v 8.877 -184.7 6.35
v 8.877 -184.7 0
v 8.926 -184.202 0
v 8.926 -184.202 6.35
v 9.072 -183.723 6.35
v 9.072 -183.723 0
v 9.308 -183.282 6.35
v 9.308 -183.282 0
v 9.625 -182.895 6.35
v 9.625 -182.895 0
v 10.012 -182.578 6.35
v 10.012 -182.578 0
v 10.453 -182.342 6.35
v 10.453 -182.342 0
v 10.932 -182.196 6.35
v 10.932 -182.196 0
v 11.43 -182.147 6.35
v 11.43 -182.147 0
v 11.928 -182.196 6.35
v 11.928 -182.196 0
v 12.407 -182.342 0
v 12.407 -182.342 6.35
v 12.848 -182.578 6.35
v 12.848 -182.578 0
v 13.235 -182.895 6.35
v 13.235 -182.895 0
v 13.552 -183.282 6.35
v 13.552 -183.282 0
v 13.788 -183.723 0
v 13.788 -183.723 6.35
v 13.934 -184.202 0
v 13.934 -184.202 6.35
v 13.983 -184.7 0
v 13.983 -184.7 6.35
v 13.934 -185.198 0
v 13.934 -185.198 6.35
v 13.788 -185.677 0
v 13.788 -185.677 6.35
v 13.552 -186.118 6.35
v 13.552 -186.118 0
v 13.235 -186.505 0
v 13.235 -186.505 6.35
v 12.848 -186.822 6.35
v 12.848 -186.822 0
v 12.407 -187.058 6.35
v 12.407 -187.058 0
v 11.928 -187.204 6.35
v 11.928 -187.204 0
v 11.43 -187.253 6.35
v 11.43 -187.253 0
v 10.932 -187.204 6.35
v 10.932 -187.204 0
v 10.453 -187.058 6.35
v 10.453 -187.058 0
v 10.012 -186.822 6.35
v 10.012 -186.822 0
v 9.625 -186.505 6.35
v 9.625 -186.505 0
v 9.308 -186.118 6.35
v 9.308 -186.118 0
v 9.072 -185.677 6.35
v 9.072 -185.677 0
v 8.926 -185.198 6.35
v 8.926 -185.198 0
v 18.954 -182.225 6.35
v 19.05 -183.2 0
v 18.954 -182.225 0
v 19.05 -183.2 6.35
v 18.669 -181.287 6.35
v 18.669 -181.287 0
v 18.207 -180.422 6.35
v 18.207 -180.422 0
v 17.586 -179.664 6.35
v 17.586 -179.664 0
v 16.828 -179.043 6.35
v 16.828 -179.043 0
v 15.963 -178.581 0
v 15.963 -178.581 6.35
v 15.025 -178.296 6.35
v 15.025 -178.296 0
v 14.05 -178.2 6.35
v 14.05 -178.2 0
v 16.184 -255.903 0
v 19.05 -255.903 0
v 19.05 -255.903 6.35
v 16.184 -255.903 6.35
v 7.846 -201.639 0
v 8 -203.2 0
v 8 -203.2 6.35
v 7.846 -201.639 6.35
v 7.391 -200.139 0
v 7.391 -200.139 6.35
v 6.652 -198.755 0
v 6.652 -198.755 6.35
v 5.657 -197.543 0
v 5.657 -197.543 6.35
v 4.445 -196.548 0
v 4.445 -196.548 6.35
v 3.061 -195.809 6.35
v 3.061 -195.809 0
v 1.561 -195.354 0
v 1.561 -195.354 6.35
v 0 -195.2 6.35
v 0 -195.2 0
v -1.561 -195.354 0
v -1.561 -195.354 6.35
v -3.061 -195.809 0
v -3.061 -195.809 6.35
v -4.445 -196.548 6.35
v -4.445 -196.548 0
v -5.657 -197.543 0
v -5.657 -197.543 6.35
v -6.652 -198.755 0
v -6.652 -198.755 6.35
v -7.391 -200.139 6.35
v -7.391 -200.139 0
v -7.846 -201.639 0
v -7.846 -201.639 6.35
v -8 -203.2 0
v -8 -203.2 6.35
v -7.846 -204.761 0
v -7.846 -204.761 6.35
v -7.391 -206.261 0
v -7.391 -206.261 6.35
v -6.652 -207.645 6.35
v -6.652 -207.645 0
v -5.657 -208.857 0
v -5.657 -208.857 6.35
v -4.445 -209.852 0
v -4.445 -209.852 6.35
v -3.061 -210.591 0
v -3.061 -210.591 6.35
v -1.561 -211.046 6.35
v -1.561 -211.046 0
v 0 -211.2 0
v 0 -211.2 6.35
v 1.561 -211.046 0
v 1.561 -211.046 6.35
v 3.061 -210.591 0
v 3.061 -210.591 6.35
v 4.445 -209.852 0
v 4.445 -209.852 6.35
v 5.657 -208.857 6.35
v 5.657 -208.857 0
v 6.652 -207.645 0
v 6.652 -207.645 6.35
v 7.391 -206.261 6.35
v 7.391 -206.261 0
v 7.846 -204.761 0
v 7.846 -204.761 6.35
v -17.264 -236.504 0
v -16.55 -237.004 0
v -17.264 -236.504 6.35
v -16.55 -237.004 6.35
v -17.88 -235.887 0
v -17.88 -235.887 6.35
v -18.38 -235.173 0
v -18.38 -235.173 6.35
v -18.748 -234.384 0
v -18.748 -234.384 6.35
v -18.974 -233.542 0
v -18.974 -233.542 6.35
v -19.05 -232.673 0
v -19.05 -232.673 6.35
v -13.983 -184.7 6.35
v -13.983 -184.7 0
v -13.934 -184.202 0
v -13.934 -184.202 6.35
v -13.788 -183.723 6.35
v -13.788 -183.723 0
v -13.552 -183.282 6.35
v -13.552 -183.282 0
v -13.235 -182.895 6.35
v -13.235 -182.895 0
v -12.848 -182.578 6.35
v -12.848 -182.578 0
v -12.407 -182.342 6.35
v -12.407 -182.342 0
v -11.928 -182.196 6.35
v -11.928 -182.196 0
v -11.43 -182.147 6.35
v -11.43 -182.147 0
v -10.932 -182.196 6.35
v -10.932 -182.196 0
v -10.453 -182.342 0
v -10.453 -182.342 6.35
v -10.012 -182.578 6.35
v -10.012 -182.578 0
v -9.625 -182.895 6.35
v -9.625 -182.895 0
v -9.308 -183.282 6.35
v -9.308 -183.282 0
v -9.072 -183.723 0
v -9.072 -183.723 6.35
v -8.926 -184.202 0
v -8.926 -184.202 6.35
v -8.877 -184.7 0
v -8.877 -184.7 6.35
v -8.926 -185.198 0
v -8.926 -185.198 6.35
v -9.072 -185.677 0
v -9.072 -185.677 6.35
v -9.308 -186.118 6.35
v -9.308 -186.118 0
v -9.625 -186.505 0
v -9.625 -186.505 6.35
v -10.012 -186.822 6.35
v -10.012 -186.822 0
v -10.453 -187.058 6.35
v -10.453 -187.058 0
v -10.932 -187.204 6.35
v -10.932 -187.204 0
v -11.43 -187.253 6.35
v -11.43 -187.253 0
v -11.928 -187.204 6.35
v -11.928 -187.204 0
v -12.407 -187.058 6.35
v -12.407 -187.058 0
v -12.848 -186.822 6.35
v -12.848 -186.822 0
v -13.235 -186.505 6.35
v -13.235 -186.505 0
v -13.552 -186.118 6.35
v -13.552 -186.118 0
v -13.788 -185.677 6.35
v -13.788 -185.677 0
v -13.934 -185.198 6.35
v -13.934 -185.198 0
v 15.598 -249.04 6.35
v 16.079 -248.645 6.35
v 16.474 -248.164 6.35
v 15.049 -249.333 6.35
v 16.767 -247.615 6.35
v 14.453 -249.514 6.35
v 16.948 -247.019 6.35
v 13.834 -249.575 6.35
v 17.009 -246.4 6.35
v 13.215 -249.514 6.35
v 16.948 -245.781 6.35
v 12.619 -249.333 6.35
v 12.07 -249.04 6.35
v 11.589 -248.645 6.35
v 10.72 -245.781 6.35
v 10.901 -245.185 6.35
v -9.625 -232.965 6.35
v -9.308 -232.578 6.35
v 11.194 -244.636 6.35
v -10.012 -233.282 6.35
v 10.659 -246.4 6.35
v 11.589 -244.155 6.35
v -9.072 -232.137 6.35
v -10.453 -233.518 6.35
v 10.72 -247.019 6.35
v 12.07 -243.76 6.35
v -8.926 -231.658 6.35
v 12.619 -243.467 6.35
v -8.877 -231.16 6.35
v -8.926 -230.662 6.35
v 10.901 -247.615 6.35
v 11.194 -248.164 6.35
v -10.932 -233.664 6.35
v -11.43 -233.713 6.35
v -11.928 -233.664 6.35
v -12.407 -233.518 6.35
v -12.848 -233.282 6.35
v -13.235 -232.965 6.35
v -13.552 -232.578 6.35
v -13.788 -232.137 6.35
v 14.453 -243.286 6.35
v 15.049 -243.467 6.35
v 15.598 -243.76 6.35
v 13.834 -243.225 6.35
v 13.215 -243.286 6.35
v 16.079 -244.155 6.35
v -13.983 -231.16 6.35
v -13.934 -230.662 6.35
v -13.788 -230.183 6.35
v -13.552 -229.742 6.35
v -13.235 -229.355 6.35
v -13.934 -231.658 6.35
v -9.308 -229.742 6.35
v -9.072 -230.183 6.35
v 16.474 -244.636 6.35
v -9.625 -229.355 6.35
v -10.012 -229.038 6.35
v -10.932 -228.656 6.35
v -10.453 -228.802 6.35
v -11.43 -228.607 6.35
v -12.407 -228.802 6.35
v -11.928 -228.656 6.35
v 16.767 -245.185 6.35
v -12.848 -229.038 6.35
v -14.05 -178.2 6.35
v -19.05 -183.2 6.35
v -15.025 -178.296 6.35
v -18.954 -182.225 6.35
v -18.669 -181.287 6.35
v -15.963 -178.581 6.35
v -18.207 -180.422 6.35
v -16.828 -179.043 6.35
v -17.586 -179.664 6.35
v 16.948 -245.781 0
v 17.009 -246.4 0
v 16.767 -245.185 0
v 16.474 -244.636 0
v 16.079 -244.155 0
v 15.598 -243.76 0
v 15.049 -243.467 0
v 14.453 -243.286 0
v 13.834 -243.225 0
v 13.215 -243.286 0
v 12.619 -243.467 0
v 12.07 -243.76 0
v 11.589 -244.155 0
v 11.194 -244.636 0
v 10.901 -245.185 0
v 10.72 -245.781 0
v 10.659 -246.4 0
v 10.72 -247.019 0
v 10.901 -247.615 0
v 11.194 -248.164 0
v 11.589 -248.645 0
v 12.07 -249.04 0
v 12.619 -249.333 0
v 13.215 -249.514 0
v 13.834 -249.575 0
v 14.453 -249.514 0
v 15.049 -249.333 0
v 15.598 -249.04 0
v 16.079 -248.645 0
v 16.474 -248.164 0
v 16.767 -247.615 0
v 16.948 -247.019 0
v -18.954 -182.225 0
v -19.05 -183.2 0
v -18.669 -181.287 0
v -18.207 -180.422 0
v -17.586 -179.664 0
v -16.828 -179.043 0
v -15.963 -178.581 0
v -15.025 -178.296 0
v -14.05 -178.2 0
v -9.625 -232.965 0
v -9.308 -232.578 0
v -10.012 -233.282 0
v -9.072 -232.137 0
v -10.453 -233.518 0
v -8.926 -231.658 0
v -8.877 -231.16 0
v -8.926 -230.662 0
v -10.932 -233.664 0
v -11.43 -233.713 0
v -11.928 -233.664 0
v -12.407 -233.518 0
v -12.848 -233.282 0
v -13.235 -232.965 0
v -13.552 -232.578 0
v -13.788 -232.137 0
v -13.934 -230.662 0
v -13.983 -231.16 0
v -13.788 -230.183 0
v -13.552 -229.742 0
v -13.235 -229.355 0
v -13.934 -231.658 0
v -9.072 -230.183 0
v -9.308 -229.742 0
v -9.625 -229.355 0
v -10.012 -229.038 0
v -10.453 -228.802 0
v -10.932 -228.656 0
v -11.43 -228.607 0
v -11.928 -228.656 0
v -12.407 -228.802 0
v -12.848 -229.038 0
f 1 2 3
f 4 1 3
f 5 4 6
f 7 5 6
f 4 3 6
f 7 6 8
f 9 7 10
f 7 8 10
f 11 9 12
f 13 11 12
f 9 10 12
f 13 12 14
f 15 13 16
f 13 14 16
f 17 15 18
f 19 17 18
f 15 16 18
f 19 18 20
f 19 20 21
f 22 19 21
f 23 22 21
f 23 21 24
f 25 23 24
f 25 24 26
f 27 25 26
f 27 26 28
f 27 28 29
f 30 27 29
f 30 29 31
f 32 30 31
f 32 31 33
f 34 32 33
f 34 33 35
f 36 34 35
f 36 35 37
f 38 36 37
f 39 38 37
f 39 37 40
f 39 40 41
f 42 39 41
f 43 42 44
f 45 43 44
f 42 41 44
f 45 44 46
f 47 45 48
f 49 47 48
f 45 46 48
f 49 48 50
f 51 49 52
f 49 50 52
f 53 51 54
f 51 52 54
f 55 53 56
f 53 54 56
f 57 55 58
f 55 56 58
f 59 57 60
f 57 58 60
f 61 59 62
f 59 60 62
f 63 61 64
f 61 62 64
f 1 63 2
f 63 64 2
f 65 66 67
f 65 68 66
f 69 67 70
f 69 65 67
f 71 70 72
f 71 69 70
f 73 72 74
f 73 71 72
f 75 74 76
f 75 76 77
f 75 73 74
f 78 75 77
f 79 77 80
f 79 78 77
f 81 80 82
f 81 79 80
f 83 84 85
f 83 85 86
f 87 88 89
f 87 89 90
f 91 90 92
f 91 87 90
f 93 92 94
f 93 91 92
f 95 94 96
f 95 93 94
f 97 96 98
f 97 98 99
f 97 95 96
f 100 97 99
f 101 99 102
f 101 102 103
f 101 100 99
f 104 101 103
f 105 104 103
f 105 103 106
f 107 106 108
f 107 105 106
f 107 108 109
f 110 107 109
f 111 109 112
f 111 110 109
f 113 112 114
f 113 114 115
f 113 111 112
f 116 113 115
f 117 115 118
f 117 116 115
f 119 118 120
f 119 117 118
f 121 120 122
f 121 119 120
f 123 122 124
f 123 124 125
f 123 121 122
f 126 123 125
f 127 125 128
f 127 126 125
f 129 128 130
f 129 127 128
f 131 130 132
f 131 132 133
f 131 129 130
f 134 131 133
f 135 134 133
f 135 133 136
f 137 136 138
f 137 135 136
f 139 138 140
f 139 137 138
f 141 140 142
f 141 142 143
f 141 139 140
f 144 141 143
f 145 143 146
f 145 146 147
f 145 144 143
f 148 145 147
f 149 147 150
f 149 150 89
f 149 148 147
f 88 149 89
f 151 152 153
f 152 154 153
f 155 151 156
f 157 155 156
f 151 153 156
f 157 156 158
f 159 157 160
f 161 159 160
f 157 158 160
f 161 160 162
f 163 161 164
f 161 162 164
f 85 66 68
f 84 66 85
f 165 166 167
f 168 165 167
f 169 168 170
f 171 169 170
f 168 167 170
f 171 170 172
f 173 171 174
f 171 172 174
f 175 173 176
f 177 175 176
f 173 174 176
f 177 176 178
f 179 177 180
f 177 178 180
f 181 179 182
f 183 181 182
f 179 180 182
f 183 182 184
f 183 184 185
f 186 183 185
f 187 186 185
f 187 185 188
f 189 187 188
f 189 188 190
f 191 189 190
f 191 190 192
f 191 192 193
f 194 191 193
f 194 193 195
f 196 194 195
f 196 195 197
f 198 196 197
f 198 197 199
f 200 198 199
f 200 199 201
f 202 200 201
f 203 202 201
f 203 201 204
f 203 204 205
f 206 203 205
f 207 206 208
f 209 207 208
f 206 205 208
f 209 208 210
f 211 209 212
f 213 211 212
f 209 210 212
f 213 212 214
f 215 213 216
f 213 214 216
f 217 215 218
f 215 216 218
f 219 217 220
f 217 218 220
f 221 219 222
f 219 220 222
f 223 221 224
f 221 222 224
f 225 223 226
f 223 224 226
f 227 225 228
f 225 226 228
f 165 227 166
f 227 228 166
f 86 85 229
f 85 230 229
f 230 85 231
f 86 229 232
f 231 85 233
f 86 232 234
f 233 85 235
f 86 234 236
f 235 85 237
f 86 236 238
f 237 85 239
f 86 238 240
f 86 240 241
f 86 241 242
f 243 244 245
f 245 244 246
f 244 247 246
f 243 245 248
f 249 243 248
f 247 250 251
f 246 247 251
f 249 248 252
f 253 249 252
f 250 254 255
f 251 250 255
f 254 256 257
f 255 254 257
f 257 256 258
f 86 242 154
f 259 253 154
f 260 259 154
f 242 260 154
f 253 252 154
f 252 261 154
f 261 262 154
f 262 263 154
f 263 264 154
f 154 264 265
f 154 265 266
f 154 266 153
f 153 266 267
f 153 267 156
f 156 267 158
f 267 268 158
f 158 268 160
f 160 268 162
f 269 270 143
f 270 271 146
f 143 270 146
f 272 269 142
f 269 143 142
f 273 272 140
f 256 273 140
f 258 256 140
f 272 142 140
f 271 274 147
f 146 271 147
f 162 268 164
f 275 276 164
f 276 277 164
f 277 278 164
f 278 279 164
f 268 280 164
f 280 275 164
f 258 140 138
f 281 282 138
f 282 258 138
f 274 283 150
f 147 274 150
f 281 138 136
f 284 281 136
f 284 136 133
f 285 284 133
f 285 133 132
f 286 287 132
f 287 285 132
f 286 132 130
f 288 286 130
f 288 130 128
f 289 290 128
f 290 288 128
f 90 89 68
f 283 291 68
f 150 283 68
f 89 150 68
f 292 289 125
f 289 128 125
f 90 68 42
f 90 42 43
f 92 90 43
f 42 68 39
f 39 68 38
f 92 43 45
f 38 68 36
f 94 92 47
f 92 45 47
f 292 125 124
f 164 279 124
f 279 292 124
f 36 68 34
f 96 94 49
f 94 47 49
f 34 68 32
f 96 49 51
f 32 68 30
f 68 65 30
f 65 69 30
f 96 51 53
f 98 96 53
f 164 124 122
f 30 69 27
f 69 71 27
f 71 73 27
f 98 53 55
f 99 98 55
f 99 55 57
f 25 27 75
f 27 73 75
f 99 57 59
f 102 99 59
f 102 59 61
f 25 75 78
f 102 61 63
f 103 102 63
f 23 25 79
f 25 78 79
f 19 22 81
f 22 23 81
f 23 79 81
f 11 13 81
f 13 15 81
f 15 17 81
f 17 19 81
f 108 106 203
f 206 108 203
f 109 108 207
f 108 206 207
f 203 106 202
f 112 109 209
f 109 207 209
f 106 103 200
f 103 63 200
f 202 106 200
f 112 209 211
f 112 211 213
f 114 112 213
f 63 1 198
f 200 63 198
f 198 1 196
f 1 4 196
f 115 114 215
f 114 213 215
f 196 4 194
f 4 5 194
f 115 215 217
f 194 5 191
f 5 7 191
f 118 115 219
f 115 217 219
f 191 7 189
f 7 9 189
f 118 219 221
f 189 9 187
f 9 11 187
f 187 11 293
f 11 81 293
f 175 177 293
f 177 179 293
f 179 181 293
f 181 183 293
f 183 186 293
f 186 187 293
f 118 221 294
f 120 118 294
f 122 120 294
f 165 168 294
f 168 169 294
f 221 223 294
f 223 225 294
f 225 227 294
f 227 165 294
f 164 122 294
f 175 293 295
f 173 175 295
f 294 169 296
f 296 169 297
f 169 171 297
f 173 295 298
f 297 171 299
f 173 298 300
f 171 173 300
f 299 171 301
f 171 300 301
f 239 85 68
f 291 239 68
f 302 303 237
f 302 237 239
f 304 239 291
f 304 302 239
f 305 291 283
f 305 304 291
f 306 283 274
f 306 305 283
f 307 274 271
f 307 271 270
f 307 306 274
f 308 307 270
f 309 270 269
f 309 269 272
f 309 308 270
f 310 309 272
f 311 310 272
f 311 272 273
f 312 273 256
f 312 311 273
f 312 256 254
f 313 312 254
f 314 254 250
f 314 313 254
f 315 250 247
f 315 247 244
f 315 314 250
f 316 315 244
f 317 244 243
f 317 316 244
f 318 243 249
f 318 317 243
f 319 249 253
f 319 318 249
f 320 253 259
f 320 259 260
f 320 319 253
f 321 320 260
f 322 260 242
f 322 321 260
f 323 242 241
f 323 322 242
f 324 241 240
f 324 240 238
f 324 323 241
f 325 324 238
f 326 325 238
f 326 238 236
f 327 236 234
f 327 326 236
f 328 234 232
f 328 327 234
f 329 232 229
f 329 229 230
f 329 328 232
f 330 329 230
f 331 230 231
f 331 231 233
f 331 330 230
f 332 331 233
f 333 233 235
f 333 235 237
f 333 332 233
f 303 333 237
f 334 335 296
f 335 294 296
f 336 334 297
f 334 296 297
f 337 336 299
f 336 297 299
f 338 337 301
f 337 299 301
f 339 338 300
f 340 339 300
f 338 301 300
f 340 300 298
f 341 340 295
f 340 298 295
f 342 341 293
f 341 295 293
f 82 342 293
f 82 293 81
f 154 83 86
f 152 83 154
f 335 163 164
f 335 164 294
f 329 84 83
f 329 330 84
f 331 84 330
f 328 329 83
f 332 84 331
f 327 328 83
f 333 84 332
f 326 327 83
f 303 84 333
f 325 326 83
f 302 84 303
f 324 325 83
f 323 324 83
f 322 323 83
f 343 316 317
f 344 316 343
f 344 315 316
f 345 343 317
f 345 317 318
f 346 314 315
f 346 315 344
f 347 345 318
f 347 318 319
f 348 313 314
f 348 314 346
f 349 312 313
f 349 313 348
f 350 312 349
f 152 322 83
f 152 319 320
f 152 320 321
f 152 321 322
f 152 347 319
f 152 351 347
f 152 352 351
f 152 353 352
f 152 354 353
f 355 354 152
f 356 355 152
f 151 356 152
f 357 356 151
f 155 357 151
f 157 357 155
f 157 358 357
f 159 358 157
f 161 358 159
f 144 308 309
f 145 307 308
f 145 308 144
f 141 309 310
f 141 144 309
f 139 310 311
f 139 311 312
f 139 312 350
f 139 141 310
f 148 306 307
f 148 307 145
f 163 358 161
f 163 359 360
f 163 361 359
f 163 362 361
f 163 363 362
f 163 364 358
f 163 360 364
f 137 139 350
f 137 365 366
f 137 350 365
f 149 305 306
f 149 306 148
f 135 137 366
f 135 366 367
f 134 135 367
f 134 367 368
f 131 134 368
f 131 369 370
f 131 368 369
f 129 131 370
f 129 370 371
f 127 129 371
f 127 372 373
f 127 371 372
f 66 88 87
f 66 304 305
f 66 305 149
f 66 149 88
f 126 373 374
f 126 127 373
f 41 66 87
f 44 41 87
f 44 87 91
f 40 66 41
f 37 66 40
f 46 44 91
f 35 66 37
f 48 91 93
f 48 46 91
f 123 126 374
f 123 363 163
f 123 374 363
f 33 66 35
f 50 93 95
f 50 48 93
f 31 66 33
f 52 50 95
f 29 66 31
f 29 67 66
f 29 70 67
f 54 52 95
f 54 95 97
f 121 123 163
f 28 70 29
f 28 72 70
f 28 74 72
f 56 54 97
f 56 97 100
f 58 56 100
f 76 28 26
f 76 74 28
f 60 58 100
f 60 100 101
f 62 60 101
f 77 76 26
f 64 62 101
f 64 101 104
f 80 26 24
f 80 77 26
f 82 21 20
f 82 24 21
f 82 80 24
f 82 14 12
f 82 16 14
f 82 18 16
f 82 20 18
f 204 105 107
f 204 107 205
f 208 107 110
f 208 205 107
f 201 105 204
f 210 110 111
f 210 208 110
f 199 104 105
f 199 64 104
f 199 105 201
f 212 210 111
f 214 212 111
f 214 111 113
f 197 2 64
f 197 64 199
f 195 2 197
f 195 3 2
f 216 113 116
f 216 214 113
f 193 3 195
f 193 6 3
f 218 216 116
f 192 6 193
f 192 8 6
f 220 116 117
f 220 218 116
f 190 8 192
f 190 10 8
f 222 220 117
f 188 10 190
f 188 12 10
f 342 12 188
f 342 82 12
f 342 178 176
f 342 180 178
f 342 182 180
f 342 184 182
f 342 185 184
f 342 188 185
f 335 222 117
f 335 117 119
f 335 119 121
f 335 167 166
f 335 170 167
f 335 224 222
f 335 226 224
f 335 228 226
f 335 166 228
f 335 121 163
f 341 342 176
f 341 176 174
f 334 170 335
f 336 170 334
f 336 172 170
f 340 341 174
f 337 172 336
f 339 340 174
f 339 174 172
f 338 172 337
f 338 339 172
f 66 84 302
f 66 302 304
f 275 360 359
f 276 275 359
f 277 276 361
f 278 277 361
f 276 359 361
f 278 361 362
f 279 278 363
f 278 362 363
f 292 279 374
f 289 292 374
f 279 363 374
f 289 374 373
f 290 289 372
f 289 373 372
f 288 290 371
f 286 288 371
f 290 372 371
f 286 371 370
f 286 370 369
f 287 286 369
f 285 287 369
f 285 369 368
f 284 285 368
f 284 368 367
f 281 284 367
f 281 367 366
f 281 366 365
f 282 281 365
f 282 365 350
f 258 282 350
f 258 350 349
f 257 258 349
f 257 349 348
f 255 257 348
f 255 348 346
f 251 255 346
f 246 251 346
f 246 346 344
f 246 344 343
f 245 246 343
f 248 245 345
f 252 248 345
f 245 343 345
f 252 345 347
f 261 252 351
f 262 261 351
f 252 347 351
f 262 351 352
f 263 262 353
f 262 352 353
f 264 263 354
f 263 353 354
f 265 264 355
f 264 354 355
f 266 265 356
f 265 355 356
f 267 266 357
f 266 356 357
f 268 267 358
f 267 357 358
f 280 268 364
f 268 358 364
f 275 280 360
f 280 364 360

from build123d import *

# Parameters (mm, degrees)
SKETCH1_R                   = 3.175
SKETCH1_R_2                 = 8
BOSS_EXTRUDE1_DEPTH         = 6.35
FILLET1_R                   = 5
F_1_4_20_TAPPED_HOLE1_D     = 5.1054
F_1_4_20_TAPPED_HOLE1_DEPTH = 19.05
F_1_4_20_TAPPED_HOLE1_TIP   = 1.533816902


with BuildPart() as part:
    # Sketch1 → Boss-Extrude1 (new body)
    with BuildSketch(Plane.XY):
        Polygon((16.184070214, -255.902577388), (-19.05, -235.560177465), (-19.05, -178.2), (19.05, -178.2), (19.05, -255.902577388), align=None)
        with Locations((13.834070214, -246.4)):
            Circle(SKETCH1_R, mode=Mode.SUBTRACT)
        with Locations((0, -203.2)):
            Circle(SKETCH1_R_2, mode=Mode.SUBTRACT)
    extrude(amount=BOSS_EXTRUDE1_DEPTH)

    # Fillet1
    fillet1_edges = [part.edges().sort_by_distance(p)[0] for p in [
        (-19.05, -235.560177465, 3.175),
        (-19.05, -178.2, 3.175),
        (19.05, -178.2, 3.175),
    ]]
    fillet(fillet1_edges, radius=FILLET1_R)

    # 1/4-20 Tapped Hole1
    with Locations(Plane.XY.offset(6.35)):
        with Locations((-11.43, -184.7), (-11.43, -231.16), (11.43, -184.7)):
            Hole(F_1_4_20_TAPPED_HOLE1_D / 2, depth=F_1_4_20_TAPPED_HOLE1_DEPTH)
            with Locations((0, 0, -(F_1_4_20_TAPPED_HOLE1_DEPTH + F_1_4_20_TAPPED_HOLE1_TIP / 2))):  # 118° drill point
                Cone(0, F_1_4_20_TAPPED_HOLE1_D / 2, F_1_4_20_TAPPED_HOLE1_TIP, mode=Mode.SUBTRACT)


solid = part.part
